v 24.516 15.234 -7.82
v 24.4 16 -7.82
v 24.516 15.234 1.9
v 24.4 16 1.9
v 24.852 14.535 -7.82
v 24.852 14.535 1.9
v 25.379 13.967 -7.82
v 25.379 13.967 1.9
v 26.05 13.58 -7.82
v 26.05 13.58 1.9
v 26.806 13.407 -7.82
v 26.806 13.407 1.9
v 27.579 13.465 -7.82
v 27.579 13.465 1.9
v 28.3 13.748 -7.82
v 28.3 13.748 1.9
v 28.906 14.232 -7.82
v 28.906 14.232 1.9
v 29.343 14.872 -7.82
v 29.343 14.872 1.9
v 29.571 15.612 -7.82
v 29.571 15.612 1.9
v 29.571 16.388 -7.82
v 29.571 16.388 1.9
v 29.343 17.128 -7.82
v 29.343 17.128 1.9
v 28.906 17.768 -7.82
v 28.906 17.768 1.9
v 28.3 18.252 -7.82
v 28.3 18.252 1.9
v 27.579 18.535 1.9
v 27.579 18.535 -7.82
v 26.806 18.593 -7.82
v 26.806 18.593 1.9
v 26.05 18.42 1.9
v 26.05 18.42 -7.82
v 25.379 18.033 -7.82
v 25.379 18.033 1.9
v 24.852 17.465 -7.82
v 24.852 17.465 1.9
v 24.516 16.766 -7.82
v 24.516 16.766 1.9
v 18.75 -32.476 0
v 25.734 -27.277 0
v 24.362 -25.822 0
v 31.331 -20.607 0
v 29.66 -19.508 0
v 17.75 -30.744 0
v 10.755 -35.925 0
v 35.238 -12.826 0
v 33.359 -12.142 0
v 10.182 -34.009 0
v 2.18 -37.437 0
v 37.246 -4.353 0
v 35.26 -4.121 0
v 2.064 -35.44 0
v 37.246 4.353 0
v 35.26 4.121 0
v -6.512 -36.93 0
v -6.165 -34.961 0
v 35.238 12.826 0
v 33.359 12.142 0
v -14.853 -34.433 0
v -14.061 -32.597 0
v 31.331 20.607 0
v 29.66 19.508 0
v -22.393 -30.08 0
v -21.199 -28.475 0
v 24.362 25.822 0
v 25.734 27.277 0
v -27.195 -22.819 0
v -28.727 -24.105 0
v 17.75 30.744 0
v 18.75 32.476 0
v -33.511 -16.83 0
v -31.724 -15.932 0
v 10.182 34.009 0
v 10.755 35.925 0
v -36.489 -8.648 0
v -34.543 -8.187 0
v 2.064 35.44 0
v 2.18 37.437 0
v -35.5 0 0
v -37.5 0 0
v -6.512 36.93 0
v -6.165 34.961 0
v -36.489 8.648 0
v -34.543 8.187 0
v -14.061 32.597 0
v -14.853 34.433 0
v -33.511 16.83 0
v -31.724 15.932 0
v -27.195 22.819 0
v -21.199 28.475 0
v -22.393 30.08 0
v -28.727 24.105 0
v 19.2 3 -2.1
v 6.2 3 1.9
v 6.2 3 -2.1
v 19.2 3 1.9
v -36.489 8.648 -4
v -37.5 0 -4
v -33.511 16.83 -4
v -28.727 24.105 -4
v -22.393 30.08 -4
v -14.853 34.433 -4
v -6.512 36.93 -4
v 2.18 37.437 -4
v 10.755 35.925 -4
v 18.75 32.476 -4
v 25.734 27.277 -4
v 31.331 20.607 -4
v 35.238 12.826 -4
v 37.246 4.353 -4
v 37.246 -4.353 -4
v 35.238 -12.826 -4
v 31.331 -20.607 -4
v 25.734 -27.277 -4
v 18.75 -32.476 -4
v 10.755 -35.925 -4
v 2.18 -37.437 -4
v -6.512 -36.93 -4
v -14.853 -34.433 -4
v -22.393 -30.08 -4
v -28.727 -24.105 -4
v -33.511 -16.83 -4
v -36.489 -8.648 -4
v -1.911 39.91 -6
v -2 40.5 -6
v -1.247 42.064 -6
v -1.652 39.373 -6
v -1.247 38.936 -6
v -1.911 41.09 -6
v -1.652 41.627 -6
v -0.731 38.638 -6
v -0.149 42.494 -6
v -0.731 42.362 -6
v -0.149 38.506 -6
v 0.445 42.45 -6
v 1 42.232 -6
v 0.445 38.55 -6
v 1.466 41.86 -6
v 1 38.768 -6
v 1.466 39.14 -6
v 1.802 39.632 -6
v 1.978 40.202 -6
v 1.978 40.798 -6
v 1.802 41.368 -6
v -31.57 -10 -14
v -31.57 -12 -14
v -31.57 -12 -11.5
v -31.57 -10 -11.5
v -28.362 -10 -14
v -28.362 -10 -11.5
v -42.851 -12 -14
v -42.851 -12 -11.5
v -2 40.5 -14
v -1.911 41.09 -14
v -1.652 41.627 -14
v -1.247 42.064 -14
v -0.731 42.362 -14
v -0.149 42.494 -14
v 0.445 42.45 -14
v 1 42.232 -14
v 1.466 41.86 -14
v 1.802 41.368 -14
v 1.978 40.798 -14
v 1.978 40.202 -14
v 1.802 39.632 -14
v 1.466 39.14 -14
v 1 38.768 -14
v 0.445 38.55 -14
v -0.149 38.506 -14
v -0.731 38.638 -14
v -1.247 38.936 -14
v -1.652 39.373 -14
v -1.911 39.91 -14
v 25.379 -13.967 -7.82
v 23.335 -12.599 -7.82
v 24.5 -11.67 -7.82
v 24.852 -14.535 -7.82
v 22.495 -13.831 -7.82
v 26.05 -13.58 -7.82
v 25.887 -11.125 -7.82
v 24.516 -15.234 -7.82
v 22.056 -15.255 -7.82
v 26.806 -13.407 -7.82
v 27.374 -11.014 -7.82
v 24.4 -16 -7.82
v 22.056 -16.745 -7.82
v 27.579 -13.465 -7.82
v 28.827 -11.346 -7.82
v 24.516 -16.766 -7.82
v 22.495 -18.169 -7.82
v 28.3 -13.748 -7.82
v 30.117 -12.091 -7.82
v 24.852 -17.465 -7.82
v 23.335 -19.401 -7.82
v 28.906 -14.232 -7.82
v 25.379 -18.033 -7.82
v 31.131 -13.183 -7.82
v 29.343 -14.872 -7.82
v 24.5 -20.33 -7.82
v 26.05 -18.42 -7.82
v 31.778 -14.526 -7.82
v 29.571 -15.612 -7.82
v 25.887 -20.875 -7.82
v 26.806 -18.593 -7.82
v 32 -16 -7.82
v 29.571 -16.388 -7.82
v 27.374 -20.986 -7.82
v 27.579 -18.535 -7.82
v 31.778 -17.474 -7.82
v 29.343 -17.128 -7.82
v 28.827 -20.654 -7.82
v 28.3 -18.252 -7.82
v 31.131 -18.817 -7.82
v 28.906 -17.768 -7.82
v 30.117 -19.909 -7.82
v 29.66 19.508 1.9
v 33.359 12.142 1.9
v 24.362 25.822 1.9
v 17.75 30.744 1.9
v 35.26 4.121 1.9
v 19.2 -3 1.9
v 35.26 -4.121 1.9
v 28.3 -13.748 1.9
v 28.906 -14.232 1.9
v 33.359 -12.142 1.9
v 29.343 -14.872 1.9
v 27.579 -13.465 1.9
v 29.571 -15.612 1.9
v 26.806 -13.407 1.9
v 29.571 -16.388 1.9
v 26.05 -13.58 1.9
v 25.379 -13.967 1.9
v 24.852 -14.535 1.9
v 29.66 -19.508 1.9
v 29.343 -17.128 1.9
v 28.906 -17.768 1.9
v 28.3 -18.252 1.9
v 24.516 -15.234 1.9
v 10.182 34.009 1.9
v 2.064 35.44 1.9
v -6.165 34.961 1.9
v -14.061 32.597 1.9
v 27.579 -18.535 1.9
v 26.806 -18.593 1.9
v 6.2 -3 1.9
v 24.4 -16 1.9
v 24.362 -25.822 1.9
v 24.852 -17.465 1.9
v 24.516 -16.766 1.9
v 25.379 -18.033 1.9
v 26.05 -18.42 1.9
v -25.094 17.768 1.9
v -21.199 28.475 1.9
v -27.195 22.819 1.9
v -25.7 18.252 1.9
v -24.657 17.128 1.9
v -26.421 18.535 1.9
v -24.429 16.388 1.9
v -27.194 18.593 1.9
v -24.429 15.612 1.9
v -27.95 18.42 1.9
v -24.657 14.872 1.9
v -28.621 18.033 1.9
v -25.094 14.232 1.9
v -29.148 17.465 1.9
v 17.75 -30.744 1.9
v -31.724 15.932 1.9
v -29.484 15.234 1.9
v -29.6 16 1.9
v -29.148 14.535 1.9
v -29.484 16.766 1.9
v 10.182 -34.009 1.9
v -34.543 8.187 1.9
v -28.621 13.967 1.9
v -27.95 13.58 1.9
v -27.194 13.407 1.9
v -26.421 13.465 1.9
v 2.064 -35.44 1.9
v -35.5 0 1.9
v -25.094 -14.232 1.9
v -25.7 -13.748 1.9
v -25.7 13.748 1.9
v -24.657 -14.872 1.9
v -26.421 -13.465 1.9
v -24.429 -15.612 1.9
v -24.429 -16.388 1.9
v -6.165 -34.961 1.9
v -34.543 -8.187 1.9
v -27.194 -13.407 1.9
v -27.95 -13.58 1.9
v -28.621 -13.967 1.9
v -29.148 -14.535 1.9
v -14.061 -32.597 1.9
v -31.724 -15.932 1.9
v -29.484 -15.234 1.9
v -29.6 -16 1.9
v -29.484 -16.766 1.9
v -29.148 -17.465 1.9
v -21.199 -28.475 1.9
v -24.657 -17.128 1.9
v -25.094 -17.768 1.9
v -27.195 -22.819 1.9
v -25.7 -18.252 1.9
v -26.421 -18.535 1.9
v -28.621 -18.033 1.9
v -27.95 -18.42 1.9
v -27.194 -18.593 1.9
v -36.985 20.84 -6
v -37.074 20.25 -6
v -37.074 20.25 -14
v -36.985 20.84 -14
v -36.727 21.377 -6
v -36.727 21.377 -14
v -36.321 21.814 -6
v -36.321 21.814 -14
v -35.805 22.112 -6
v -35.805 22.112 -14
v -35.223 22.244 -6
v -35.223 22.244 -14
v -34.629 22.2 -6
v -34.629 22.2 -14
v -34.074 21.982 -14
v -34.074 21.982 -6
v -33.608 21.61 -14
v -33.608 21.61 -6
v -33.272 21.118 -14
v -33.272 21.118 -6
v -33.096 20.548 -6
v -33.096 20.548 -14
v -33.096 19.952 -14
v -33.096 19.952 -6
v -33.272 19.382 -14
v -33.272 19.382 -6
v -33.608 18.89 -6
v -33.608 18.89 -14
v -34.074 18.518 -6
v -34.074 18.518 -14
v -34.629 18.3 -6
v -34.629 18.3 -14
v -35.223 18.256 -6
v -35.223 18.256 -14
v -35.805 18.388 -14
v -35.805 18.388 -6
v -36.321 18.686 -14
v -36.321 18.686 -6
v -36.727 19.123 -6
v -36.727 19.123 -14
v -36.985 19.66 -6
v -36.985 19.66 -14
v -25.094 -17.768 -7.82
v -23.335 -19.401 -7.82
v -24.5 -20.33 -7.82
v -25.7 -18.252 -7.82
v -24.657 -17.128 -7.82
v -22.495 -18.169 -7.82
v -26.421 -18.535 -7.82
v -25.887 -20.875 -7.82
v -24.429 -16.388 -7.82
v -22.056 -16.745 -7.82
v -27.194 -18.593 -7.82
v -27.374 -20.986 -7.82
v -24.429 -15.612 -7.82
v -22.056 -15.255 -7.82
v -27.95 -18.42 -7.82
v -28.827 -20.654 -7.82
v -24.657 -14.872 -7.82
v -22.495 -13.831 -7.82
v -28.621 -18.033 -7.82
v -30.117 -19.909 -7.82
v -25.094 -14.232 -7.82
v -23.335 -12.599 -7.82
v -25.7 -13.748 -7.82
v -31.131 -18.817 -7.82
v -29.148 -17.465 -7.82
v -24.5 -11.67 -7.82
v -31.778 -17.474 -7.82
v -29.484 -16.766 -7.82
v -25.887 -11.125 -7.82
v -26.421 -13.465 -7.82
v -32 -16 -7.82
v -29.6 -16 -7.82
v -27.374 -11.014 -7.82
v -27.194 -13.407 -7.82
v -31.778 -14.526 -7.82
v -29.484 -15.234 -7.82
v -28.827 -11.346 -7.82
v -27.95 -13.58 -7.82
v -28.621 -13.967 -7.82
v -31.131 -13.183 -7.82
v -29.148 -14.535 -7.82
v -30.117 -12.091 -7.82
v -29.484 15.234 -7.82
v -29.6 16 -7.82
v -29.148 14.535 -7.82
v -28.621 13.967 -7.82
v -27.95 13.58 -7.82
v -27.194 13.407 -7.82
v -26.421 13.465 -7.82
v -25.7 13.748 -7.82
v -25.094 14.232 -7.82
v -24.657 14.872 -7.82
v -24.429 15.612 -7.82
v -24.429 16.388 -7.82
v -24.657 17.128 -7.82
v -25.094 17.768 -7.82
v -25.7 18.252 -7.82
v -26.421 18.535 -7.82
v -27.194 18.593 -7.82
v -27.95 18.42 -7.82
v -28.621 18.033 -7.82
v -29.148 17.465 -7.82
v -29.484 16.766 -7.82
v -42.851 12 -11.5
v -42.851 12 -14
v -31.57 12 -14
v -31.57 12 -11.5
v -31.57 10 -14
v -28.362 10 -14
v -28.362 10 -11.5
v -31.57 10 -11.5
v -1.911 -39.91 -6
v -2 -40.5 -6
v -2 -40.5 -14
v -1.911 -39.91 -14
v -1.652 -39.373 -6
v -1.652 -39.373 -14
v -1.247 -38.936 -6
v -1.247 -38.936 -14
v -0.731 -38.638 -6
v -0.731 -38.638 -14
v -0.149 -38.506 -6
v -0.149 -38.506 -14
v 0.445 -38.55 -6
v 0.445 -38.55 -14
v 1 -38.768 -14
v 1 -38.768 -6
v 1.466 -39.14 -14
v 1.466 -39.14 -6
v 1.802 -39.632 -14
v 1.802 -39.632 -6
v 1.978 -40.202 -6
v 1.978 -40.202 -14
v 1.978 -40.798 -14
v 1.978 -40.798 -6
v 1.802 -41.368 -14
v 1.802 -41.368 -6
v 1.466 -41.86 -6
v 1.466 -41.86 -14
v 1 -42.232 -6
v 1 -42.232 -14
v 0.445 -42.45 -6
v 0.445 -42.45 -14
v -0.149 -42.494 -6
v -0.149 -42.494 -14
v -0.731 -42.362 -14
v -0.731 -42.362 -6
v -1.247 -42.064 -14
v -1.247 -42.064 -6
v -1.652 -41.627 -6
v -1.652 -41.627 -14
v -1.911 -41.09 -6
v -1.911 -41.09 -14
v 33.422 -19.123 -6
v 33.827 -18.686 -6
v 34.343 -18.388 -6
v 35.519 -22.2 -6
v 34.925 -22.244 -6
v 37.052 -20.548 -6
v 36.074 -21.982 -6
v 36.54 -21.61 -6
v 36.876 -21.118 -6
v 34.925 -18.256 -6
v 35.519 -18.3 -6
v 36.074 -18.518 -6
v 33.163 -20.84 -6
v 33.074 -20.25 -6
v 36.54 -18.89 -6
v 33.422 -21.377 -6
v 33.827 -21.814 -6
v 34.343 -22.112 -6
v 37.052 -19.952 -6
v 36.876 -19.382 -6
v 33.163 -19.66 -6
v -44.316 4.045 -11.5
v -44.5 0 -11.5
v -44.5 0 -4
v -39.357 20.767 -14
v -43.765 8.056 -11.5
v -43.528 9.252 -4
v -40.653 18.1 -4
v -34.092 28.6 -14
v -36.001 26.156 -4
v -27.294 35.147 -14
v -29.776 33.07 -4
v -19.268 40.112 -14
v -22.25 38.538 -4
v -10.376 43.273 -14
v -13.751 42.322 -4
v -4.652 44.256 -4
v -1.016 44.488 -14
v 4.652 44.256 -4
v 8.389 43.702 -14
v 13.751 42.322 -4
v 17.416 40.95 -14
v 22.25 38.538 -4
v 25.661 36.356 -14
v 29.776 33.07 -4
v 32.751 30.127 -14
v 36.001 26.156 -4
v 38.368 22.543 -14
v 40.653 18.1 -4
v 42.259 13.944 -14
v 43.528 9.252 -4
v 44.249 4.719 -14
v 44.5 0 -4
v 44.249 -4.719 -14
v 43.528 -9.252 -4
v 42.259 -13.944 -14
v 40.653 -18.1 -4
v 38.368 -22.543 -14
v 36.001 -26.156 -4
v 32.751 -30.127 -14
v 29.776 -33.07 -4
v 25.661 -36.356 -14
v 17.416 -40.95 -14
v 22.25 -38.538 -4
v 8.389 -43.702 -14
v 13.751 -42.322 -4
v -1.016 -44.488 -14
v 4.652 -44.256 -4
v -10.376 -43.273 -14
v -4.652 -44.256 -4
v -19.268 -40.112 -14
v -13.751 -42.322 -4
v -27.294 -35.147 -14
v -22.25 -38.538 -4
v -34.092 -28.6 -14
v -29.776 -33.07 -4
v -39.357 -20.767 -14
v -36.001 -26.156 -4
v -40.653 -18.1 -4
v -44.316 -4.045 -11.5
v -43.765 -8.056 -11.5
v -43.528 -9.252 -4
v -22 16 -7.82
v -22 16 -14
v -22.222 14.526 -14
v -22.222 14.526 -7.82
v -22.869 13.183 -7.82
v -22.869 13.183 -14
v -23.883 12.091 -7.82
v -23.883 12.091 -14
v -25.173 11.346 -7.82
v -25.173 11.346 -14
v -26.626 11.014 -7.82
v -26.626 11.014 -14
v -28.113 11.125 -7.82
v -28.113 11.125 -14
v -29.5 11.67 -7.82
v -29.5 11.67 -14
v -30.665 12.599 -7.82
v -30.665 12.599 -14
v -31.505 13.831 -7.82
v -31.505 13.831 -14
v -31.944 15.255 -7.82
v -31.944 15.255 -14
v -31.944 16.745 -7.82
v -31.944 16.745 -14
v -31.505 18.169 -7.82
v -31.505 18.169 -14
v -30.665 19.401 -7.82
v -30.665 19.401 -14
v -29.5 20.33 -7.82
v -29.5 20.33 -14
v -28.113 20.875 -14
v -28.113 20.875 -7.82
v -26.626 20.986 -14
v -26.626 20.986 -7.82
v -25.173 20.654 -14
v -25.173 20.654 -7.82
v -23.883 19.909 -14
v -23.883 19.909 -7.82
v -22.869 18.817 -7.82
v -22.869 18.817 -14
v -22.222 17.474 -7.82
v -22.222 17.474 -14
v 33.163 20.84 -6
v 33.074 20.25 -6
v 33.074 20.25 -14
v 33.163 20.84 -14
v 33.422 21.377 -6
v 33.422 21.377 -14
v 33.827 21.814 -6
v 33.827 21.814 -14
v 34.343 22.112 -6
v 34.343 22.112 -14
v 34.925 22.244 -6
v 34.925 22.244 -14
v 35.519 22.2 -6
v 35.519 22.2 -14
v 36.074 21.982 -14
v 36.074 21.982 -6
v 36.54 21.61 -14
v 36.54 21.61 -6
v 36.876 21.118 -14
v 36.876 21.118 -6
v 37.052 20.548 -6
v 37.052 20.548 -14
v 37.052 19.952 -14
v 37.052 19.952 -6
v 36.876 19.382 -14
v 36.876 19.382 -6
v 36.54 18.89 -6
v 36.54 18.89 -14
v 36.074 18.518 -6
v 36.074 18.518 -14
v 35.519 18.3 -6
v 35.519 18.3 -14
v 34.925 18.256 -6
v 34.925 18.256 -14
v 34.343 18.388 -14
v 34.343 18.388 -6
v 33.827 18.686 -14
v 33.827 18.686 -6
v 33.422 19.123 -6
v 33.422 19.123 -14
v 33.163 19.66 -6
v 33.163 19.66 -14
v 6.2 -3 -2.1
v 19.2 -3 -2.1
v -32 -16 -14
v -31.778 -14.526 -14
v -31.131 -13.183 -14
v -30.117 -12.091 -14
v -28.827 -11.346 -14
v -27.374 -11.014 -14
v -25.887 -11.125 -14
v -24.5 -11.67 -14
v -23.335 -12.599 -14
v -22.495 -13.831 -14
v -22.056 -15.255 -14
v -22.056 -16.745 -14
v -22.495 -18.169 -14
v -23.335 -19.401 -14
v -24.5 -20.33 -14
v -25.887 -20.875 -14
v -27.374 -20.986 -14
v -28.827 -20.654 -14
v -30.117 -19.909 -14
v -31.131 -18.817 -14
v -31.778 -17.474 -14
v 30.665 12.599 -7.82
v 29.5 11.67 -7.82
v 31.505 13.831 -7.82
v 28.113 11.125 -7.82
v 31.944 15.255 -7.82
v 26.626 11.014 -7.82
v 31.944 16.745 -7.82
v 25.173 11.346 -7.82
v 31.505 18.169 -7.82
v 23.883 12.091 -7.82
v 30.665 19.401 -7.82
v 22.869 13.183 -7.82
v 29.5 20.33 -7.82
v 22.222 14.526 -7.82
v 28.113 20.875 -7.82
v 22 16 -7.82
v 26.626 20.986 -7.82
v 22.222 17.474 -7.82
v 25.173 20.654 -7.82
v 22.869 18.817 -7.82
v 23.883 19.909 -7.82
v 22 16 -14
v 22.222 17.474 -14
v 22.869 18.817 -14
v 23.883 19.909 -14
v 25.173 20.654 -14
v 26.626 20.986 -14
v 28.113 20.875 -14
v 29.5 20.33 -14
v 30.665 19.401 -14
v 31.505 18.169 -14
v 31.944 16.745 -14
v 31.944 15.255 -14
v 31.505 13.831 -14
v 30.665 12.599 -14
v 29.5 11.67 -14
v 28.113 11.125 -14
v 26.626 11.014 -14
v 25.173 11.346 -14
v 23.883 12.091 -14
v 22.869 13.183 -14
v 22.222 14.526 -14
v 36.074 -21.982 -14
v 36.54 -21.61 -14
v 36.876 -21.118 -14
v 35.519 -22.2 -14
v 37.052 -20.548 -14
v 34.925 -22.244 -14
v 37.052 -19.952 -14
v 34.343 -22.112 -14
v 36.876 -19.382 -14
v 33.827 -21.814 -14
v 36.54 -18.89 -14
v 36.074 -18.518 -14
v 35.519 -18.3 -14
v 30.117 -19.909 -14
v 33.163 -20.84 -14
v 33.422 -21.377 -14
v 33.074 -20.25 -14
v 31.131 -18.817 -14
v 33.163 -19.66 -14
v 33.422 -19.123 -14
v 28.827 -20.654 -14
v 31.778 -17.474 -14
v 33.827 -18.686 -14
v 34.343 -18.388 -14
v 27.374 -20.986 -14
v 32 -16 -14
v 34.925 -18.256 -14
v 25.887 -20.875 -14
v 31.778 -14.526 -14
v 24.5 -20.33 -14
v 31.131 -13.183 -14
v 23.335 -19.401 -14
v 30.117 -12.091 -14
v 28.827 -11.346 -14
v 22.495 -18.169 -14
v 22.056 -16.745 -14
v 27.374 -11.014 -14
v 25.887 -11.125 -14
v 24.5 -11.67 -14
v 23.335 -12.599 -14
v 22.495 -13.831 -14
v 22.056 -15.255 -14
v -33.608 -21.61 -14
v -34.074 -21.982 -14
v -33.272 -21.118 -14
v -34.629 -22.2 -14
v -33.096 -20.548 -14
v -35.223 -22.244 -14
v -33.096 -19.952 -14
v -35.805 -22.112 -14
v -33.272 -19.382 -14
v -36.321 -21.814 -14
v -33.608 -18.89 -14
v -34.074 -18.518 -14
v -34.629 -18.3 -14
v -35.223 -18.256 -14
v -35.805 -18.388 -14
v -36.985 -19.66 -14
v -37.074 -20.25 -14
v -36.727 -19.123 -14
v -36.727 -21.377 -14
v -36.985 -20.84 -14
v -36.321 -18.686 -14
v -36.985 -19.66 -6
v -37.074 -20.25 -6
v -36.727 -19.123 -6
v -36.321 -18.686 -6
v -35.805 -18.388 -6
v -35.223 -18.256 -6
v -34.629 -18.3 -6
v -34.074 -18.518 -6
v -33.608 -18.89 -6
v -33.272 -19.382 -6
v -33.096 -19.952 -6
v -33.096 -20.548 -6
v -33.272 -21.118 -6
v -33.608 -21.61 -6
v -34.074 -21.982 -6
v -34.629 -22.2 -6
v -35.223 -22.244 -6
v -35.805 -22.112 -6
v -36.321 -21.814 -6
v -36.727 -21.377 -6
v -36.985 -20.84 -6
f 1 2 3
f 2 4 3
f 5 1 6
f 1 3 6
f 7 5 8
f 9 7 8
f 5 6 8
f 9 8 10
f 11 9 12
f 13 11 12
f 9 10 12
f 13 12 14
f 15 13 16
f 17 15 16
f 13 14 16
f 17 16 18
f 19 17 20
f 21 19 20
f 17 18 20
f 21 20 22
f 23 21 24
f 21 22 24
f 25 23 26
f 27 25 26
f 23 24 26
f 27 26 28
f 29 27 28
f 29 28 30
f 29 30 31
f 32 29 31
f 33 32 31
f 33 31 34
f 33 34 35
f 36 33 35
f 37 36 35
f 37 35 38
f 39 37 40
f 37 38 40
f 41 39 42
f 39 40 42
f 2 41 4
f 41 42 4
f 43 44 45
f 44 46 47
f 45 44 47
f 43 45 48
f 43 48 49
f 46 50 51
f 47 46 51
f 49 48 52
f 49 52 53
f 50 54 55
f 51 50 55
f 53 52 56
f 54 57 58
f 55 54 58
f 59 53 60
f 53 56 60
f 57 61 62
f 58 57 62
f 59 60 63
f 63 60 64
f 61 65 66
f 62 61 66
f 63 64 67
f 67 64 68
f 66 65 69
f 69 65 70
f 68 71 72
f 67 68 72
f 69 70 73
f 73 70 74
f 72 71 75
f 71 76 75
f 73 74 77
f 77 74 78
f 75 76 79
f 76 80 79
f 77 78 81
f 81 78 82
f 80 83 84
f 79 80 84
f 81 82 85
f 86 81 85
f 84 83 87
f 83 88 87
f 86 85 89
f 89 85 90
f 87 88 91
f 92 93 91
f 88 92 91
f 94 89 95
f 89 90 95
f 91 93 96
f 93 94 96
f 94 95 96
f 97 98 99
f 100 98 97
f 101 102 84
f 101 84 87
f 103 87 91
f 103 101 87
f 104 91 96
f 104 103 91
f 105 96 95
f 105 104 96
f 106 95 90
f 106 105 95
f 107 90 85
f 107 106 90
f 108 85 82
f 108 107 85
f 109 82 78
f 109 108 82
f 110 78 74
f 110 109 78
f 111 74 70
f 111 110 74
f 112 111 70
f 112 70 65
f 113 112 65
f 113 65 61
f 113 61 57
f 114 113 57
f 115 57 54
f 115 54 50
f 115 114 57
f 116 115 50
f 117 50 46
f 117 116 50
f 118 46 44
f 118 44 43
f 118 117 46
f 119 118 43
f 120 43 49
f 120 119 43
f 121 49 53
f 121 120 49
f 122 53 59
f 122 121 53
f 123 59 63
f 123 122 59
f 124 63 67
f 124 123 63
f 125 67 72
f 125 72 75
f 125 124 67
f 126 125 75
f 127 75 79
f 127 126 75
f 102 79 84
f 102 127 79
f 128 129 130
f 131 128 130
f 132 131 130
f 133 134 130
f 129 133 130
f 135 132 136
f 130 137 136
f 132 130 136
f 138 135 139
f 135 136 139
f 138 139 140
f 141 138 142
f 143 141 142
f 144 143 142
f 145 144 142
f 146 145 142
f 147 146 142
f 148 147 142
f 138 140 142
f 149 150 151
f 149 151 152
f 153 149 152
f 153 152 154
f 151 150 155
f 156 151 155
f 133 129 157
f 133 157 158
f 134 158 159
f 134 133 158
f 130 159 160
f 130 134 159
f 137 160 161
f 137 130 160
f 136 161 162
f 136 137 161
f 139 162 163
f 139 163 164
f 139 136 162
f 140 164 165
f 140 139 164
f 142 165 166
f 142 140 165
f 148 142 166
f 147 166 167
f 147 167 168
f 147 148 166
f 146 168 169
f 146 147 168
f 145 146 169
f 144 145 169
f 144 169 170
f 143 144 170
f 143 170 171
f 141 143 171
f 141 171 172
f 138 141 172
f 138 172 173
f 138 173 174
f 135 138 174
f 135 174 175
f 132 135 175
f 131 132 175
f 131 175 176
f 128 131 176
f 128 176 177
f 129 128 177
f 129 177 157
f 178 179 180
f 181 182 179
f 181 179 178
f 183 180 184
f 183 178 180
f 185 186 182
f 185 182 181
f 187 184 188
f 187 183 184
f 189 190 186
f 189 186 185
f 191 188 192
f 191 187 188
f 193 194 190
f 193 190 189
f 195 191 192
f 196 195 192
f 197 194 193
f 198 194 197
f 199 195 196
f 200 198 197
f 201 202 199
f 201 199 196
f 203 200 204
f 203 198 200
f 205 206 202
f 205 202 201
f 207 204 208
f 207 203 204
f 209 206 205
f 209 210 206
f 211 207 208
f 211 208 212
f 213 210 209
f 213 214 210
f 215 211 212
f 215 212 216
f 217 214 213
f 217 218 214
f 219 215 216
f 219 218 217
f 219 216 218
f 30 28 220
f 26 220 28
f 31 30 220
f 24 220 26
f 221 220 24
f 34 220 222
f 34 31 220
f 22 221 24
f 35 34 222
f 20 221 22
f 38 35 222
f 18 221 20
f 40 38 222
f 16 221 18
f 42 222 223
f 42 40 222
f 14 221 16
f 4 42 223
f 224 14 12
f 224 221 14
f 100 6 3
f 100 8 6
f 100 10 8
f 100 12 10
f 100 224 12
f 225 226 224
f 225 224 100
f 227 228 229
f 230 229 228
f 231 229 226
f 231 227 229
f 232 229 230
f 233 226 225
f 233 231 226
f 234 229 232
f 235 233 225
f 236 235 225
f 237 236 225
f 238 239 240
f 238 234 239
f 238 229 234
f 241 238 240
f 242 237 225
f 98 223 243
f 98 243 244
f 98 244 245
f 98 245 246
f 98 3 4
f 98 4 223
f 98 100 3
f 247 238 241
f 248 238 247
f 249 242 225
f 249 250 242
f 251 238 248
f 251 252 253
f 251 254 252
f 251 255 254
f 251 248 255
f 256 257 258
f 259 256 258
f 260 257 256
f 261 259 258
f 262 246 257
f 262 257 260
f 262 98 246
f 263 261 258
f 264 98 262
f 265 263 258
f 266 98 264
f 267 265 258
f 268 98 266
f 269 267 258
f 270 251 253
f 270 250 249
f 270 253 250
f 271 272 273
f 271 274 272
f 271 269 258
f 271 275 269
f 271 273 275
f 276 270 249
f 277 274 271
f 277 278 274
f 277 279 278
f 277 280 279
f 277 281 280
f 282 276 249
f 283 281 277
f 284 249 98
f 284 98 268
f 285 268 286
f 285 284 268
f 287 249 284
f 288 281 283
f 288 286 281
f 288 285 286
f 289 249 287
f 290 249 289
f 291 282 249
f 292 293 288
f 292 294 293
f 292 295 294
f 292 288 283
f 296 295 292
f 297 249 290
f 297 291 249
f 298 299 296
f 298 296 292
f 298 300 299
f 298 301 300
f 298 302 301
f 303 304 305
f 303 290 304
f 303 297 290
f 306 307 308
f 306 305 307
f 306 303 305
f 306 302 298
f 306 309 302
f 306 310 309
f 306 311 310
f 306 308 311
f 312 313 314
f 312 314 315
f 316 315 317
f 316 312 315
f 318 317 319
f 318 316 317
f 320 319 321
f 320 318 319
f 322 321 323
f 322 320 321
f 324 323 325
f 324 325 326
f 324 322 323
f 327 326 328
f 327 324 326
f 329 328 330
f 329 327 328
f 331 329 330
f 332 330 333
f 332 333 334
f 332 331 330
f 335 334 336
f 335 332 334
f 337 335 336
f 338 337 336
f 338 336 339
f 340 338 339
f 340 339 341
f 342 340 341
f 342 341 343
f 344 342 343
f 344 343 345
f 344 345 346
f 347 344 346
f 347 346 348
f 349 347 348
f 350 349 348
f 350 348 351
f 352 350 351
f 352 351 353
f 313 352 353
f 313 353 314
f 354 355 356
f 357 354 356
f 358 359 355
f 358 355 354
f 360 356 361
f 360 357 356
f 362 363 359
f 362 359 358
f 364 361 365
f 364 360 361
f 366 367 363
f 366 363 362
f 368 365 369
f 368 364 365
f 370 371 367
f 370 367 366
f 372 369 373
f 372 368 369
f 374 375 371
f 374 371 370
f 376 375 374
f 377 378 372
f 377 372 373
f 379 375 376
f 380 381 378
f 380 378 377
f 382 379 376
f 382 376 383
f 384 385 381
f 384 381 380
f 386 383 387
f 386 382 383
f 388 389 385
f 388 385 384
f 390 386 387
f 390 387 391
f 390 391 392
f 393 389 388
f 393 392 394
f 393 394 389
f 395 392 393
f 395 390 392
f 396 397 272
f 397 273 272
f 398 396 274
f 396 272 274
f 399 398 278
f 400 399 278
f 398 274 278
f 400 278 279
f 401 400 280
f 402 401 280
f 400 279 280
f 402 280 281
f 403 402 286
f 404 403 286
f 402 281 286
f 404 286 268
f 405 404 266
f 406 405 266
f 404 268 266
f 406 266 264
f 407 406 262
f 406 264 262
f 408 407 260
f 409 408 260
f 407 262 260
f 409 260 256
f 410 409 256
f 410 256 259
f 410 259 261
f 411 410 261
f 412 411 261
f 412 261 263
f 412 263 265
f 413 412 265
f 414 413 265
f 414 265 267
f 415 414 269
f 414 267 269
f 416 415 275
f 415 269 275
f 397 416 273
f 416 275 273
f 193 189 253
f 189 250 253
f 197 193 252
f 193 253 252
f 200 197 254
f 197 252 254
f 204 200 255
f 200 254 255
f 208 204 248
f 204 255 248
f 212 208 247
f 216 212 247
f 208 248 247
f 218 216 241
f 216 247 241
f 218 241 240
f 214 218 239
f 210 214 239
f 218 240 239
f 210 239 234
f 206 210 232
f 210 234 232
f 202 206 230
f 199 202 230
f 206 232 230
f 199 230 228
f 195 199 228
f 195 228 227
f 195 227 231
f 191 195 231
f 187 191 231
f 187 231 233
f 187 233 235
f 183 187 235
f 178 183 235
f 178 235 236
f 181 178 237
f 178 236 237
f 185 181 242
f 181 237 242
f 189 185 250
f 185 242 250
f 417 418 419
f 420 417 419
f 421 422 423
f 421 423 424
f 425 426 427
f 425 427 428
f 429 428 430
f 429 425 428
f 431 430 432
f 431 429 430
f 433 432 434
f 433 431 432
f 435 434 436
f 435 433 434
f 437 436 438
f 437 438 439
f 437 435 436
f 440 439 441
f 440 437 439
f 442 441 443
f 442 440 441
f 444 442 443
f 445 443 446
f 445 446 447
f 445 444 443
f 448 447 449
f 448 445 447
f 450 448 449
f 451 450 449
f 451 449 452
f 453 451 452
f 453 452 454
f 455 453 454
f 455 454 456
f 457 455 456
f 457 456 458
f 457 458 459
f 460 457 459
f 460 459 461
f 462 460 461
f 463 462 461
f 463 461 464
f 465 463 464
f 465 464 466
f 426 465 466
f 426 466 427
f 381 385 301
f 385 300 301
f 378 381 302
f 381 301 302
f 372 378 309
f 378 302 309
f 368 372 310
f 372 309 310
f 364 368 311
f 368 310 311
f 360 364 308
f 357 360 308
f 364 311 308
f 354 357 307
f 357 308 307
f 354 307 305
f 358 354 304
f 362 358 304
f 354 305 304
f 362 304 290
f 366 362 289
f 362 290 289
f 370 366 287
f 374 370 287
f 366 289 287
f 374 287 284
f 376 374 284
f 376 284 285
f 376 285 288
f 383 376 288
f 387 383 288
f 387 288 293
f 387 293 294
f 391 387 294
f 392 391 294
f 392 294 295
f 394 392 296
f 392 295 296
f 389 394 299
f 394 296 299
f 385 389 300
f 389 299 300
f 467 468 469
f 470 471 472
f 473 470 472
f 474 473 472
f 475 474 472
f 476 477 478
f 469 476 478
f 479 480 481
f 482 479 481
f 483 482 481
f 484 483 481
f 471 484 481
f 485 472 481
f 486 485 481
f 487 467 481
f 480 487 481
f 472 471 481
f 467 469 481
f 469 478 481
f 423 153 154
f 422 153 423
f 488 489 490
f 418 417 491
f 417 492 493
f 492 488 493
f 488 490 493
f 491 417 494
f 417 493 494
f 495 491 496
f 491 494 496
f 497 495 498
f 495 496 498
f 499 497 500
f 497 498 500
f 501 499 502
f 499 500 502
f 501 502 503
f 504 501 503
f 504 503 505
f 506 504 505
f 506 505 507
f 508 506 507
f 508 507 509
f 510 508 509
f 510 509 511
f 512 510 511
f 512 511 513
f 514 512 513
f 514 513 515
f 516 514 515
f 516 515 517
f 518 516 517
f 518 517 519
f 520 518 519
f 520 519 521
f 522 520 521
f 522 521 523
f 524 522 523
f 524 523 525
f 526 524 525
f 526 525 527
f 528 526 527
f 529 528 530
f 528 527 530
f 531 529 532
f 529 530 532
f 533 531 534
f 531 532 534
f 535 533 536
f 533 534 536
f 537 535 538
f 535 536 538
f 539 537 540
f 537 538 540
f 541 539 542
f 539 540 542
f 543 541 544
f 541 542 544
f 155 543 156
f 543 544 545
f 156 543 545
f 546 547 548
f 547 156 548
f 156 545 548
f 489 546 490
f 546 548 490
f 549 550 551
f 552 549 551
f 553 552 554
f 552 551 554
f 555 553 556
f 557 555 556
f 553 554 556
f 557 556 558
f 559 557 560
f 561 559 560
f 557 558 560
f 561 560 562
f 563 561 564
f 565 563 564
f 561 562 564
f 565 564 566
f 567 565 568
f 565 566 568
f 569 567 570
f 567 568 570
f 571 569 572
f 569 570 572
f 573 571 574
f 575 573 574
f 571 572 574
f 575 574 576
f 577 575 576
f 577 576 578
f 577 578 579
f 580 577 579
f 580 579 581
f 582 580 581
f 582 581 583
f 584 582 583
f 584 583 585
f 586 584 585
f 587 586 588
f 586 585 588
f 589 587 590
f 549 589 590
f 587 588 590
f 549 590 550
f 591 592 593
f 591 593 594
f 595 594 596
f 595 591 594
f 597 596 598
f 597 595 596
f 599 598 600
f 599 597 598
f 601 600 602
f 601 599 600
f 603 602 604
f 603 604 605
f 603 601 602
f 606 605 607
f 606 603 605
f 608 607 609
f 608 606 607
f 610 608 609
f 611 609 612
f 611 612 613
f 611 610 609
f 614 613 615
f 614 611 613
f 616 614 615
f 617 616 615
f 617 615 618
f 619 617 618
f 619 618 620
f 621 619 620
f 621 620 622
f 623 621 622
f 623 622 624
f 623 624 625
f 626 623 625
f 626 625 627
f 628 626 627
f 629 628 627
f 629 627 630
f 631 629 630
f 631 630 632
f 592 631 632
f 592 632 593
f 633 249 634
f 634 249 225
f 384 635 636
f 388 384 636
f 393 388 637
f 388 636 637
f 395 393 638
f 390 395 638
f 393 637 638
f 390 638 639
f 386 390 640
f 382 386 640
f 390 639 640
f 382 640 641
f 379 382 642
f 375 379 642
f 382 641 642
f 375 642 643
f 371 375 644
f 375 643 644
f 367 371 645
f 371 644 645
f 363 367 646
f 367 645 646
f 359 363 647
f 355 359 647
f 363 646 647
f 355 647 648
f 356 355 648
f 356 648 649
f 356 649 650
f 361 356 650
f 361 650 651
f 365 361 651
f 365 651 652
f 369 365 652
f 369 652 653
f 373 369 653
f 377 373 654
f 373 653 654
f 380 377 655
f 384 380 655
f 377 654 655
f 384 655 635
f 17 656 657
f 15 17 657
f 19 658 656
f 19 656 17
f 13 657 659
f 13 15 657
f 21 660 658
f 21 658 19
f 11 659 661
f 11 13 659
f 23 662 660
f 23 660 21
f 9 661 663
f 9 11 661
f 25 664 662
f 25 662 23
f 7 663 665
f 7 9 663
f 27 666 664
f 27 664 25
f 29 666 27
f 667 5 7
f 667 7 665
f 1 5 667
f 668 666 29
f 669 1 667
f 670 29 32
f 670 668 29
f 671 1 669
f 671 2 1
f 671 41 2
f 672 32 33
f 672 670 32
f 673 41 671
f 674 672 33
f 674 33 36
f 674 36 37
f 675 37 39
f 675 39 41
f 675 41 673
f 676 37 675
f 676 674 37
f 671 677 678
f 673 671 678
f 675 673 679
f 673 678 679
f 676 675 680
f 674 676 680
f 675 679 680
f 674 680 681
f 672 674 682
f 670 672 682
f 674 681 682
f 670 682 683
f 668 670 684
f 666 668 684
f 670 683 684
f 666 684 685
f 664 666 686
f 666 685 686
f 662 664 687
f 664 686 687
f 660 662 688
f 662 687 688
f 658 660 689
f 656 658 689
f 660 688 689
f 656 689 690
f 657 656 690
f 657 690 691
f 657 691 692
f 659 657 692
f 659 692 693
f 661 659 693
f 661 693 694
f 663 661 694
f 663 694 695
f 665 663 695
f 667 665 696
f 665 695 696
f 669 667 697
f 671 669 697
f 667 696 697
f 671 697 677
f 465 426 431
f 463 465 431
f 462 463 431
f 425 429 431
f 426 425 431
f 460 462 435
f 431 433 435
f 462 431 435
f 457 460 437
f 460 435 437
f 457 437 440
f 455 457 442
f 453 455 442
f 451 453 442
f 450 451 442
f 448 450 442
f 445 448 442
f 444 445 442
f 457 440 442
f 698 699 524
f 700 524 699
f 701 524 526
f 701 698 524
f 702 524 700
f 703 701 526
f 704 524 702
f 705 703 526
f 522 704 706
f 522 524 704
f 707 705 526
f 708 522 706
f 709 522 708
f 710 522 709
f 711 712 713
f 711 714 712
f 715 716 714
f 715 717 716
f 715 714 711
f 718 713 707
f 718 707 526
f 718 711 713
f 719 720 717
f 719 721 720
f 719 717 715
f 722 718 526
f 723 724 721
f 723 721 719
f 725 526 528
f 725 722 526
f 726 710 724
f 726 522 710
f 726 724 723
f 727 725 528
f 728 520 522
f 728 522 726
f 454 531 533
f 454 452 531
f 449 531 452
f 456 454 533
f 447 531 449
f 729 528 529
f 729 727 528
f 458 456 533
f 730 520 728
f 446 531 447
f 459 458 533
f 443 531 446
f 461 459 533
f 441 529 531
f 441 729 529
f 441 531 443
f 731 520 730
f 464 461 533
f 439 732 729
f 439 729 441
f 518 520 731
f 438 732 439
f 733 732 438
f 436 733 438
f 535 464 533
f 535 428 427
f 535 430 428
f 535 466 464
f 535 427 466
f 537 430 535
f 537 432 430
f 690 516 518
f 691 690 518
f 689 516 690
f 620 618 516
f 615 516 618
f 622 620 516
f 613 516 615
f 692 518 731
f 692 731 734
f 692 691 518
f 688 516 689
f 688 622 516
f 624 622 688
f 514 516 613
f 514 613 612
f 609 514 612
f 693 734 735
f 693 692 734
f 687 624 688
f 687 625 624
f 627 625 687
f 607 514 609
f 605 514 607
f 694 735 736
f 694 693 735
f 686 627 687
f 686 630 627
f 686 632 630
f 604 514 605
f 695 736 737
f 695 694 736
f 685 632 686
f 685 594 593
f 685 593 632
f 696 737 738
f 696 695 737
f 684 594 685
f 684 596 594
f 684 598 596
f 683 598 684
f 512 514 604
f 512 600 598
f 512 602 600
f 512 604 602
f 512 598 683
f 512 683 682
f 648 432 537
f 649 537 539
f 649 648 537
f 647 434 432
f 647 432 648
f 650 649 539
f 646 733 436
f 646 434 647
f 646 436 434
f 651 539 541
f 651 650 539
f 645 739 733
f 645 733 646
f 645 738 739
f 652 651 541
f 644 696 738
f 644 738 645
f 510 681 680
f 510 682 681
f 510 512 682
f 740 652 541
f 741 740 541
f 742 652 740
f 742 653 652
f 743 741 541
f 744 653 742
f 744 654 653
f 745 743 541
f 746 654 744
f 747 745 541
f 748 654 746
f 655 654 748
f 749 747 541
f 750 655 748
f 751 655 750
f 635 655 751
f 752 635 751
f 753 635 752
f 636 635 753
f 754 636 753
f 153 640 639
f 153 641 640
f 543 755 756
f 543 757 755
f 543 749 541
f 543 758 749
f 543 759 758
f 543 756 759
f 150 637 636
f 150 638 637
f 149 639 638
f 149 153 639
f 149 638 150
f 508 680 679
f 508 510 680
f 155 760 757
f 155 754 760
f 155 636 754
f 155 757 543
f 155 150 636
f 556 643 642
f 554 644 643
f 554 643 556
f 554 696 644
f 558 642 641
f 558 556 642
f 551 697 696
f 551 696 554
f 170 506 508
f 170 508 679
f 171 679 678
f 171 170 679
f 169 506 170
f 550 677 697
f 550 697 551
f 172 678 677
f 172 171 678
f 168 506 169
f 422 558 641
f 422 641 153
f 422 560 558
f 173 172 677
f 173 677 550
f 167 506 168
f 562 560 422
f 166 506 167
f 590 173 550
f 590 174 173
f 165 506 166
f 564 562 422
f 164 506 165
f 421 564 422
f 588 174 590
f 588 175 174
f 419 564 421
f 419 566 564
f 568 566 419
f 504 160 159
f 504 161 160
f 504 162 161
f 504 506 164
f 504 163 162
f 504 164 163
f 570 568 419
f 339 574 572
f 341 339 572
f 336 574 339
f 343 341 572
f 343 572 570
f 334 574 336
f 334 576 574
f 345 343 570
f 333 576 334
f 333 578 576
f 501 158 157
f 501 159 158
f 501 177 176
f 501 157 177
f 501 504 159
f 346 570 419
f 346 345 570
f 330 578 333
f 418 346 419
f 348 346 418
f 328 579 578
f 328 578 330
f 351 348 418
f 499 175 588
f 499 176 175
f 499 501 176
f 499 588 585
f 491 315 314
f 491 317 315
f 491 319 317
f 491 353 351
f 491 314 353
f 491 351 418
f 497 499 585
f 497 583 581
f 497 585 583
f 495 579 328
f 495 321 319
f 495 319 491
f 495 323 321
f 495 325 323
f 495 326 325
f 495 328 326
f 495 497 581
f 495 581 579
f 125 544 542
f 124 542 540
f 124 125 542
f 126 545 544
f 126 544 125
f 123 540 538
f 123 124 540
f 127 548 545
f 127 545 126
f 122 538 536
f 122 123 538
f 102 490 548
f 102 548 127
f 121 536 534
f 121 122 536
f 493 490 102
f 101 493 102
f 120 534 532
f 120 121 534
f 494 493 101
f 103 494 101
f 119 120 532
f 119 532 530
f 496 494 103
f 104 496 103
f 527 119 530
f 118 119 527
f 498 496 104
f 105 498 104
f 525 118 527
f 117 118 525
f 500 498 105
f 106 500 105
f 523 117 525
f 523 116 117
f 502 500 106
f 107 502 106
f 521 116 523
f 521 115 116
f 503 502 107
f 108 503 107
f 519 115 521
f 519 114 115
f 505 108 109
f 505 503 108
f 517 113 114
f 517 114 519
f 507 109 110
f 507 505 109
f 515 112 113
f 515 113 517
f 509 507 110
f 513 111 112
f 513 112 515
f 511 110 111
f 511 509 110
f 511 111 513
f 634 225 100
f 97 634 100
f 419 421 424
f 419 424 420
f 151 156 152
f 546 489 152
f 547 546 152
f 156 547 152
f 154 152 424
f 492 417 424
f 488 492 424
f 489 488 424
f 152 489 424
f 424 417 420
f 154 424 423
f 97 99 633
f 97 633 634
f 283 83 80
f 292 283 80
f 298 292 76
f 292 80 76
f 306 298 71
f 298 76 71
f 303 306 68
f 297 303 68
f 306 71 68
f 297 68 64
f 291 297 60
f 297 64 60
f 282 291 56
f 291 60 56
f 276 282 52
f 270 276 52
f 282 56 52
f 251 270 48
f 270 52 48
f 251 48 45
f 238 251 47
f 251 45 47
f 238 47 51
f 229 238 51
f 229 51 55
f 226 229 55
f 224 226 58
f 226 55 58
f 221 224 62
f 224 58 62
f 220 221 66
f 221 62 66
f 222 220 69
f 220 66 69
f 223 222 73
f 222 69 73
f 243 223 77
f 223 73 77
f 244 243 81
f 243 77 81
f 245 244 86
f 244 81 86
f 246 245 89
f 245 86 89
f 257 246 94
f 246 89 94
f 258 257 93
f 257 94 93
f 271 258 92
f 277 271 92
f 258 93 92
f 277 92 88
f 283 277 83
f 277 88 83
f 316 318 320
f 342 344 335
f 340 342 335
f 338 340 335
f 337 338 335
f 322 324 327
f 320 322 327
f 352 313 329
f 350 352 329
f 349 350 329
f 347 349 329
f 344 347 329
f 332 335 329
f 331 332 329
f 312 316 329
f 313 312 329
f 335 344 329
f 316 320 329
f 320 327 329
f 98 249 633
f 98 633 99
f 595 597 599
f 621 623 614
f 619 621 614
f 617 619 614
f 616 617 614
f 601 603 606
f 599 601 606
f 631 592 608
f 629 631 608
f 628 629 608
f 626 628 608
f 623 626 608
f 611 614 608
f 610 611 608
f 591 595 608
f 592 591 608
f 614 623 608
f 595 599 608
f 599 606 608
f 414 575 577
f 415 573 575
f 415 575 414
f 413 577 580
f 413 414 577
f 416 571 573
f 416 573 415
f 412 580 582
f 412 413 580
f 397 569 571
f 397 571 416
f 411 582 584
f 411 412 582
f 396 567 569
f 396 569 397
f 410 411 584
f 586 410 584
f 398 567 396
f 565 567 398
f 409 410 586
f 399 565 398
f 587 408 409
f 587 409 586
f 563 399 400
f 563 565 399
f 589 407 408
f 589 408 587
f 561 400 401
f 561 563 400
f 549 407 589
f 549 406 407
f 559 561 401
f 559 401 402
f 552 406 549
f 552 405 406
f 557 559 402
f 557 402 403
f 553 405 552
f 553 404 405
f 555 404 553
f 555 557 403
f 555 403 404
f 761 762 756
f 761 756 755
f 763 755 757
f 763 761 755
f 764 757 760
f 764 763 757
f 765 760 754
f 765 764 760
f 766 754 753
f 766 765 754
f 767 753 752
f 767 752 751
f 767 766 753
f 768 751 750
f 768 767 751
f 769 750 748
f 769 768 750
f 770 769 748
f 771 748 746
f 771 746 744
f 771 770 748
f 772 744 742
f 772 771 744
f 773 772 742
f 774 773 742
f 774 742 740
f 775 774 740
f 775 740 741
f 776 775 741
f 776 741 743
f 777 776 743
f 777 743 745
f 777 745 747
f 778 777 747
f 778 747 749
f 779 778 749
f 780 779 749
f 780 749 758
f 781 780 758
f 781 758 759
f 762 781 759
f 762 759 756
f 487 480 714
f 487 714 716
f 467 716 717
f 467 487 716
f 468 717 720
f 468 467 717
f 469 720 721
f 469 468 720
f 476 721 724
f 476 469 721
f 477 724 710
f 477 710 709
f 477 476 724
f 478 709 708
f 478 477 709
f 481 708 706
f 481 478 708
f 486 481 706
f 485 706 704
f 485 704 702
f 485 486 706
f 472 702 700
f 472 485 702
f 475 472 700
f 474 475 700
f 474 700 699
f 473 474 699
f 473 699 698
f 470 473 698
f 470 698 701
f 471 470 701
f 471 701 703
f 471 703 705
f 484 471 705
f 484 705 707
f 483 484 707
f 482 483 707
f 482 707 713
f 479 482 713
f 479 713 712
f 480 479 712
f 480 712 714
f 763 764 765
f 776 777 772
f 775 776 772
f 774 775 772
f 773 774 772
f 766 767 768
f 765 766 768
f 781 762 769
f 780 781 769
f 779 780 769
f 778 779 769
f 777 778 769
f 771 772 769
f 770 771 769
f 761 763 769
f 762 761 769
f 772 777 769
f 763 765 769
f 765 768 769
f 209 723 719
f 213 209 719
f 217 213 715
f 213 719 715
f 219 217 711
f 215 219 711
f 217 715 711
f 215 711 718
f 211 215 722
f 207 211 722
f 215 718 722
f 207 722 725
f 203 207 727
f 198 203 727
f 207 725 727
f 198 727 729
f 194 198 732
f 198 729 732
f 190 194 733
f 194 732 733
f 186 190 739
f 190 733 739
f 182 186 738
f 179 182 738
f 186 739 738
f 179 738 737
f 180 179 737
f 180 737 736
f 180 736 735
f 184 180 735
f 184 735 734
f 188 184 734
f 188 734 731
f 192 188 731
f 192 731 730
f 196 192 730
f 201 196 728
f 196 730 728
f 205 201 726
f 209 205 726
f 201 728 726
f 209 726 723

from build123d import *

# Parameters (mm, degrees)
SKETCH_1_R          = 35.5
SKETCH_1_R_2        = 2.6
EXTRUDE_2_DEPTH     = 1.9
EXTRUDE_START       = 4
SKETCH_3_R          = 37.5
SKETCH_3_R_2        = 2.6
EXTRUDE_3_DEPTH     = 4
SKETCH_2_W          = 13
SKETCH_2_H          = 6
CUT_EXTRUDE_6_DEPTH = 4
SKETCH_4_R          = 44.5
SKETCH_4_R_2        = 2
EXTRUDE_4_DEPTH     = 10
SKETCH_7_R          = 2.6
CUT_EXTRUDE_7_DEPTH = 65.910014636
SKETCH_10_R         = 5
CUT_EXTRUDE_8_DEPTH = 6.18
SKETCH_12_R         = 2
EXTRUDE_6_DEPTH     = 2
CUT_EXTRUDE_9_DEPTH = 2.5


with BuildPart() as part:
    # 草图1 → 凸台-拉伸2 (new body)
    with BuildSketch(Plane.XY):
        with Locations(Location((0, 0, 0), (0, 0, 180))):
            Circle(SKETCH_1_R)
        with Locations(Location((-27, 16, 0), (0, 0, 180))):
            Circle(SKETCH_1_R_2, mode=Mode.SUBTRACT)
        with Locations(Location((-27, -16, 0), (0, 0, 180))):
            Circle(SKETCH_1_R_2, mode=Mode.SUBTRACT)
        with Locations(Location((27, -16, 0), (0, 0, 180))):
            Circle(SKETCH_1_R_2, mode=Mode.SUBTRACT)
        with Locations(Location((27, 16, 0), (0, 0, 180))):
            Circle(SKETCH_1_R_2, mode=Mode.SUBTRACT)
    extrude(amount=EXTRUDE_2_DEPTH)

    # 草图3 → 凸台-拉伸3 (add)
    with BuildSketch(Plane(origin=(0, 0, 0), x_dir=(-1, 0, 0), z_dir=(0, 0, -1)).offset(EXTRUDE_START)):
        Circle(SKETCH_3_R)
        with Locations((27, 16)):
            Circle(SKETCH_3_R_2, mode=Mode.SUBTRACT)
        with Locations((27, -16)):
            Circle(SKETCH_3_R_2, mode=Mode.SUBTRACT)
        with Locations((-27, -16)):
            Circle(SKETCH_3_R_2, mode=Mode.SUBTRACT)
        with Locations((-27, 16)):
            Circle(SKETCH_3_R_2, mode=Mode.SUBTRACT)
    extrude(amount=-EXTRUDE_3_DEPTH)

    # 草图2 → 切除-拉伸6 (cut)
    with BuildSketch(Plane.XY.offset(1.9)):
        with Locations((12.7, 0)):
            Rectangle(SKETCH_2_W, SKETCH_2_H)
    extrude(amount=-CUT_EXTRUDE_6_DEPTH, mode=Mode.SUBTRACT)

    # 草图4 → 凸台-拉伸4 (add)
    with BuildSketch(Plane(origin=(0, 0, -4), x_dir=(-1, 0, 0), z_dir=(0, 0, -1))):
        Circle(SKETCH_4_R)
        with Locations((0, 40.5)):
            Circle(SKETCH_4_R_2, mode=Mode.SUBTRACT)
        with Locations((35.074028853, 20.25)):
            Circle(SKETCH_4_R_2, mode=Mode.SUBTRACT)
        with Locations((35.074028853, -20.25)):
            Circle(SKETCH_4_R_2, mode=Mode.SUBTRACT)
        with Locations((0, -40.5)):
            Circle(SKETCH_4_R_2, mode=Mode.SUBTRACT)
        with Locations((-35.074028853, -20.25)):
            Circle(SKETCH_4_R_2, mode=Mode.SUBTRACT)
        with Locations((-35.074028853, 20.25)):
            Circle(SKETCH_4_R_2, mode=Mode.SUBTRACT)
    extrude(amount=EXTRUDE_4_DEPTH)

    # 草图7 → 切除-拉伸7 (cut, through all)
    with BuildSketch(Plane.XY.offset(1.9)):
        with Locations(Location((27, -16, 0), (0, 0, 180))):
            Circle(SKETCH_7_R)
        with Locations(Location((27, 16, 0), (0, 0, 180))):
            Circle(SKETCH_7_R)
        with Locations(Location((-27, -16, 0), (0, 0, 180))):
            Circle(SKETCH_7_R)
        with Locations(Location((-27, 16, 0), (0, 0, 180))):
            Circle(SKETCH_7_R)
    extrude(amount=-CUT_EXTRUDE_7_DEPTH, mode=Mode.SUBTRACT)

    # 草图10 → 切除-拉伸8 (cut)
    with BuildSketch(Plane(origin=(0, 0, -14), x_dir=(-1, 0, 0), z_dir=(0, 0, -1))):
        with Locations((-27, 16)):
            Circle(SKETCH_10_R)
        with Locations(Location((27, 16, 0), (0, 0, 180))):
            Circle(SKETCH_10_R)
        with Locations((27, -16)):
            Circle(SKETCH_10_R)
        with Locations(Location((-27, -16, 0), (0, 0, 180))):
            Circle(SKETCH_10_R)
    extrude(amount=-CUT_EXTRUDE_8_DEPTH, mode=Mode.SUBTRACT)

    # 草图12 → 凸台-拉伸6 (add)
    with BuildSketch(Plane.XY.offset(-4)):
        with Locations((35.074028853, -20.25)):
            Circle(SKETCH_12_R)
        with Locations((35.074028853, 20.25)):
            Circle(SKETCH_12_R)
        with Locations((0, 40.5)):
            Circle(SKETCH_12_R)
        with Locations((-35.074028853, 20.25)):
            Circle(SKETCH_12_R)
        with Locations((-35.074028853, -20.25)):
            Circle(SKETCH_12_R)
        with Locations((0, -40.5)):
            Circle(SKETCH_12_R)
    extrude(amount=-EXTRUDE_6_DEPTH)

    # 草图13 → 切除-拉伸9 (cut)
    with BuildSketch(Plane(origin=(0, 0, -14), x_dir=(-1, 0, 0), z_dir=(0, 0, -1))):
        Polygon((47.534196194, -12), (42.851487722, -12), (36.070038026, -12), (31.570038026, -12), (31.570038026, -10), (28.361849592, -10), (28.361849592, 10), (31.570038026, 10), (31.570038026, 12), (36.070038026, 12), (42.851487722, 12), (47.534196194, 12), align=None)
    extrude(amount=-CUT_EXTRUDE_9_DEPTH, mode=Mode.SUBTRACT)


solid = part.part
